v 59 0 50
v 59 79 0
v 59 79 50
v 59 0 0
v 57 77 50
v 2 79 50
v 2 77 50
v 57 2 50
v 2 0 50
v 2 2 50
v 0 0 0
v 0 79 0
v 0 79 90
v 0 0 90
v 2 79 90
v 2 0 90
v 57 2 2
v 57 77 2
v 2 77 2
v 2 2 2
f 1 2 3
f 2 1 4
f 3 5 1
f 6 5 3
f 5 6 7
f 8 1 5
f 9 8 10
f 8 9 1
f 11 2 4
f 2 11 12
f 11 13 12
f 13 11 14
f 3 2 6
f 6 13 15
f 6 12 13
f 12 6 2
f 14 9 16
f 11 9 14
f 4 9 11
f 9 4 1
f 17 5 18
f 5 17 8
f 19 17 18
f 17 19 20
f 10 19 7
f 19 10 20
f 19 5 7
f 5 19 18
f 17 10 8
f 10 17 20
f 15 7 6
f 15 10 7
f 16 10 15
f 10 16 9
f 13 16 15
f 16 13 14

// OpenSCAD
h = 50;
size = 59;
w = 79;
// bottom
difference(){
    cube([size,w,h]);
    translate([2,2,2]){
        cube([size-4,w-4,h]);
    }
}

// baffle
bh = 40;
translate([0,0,h]){
    cube([2,w,bh]);
}
